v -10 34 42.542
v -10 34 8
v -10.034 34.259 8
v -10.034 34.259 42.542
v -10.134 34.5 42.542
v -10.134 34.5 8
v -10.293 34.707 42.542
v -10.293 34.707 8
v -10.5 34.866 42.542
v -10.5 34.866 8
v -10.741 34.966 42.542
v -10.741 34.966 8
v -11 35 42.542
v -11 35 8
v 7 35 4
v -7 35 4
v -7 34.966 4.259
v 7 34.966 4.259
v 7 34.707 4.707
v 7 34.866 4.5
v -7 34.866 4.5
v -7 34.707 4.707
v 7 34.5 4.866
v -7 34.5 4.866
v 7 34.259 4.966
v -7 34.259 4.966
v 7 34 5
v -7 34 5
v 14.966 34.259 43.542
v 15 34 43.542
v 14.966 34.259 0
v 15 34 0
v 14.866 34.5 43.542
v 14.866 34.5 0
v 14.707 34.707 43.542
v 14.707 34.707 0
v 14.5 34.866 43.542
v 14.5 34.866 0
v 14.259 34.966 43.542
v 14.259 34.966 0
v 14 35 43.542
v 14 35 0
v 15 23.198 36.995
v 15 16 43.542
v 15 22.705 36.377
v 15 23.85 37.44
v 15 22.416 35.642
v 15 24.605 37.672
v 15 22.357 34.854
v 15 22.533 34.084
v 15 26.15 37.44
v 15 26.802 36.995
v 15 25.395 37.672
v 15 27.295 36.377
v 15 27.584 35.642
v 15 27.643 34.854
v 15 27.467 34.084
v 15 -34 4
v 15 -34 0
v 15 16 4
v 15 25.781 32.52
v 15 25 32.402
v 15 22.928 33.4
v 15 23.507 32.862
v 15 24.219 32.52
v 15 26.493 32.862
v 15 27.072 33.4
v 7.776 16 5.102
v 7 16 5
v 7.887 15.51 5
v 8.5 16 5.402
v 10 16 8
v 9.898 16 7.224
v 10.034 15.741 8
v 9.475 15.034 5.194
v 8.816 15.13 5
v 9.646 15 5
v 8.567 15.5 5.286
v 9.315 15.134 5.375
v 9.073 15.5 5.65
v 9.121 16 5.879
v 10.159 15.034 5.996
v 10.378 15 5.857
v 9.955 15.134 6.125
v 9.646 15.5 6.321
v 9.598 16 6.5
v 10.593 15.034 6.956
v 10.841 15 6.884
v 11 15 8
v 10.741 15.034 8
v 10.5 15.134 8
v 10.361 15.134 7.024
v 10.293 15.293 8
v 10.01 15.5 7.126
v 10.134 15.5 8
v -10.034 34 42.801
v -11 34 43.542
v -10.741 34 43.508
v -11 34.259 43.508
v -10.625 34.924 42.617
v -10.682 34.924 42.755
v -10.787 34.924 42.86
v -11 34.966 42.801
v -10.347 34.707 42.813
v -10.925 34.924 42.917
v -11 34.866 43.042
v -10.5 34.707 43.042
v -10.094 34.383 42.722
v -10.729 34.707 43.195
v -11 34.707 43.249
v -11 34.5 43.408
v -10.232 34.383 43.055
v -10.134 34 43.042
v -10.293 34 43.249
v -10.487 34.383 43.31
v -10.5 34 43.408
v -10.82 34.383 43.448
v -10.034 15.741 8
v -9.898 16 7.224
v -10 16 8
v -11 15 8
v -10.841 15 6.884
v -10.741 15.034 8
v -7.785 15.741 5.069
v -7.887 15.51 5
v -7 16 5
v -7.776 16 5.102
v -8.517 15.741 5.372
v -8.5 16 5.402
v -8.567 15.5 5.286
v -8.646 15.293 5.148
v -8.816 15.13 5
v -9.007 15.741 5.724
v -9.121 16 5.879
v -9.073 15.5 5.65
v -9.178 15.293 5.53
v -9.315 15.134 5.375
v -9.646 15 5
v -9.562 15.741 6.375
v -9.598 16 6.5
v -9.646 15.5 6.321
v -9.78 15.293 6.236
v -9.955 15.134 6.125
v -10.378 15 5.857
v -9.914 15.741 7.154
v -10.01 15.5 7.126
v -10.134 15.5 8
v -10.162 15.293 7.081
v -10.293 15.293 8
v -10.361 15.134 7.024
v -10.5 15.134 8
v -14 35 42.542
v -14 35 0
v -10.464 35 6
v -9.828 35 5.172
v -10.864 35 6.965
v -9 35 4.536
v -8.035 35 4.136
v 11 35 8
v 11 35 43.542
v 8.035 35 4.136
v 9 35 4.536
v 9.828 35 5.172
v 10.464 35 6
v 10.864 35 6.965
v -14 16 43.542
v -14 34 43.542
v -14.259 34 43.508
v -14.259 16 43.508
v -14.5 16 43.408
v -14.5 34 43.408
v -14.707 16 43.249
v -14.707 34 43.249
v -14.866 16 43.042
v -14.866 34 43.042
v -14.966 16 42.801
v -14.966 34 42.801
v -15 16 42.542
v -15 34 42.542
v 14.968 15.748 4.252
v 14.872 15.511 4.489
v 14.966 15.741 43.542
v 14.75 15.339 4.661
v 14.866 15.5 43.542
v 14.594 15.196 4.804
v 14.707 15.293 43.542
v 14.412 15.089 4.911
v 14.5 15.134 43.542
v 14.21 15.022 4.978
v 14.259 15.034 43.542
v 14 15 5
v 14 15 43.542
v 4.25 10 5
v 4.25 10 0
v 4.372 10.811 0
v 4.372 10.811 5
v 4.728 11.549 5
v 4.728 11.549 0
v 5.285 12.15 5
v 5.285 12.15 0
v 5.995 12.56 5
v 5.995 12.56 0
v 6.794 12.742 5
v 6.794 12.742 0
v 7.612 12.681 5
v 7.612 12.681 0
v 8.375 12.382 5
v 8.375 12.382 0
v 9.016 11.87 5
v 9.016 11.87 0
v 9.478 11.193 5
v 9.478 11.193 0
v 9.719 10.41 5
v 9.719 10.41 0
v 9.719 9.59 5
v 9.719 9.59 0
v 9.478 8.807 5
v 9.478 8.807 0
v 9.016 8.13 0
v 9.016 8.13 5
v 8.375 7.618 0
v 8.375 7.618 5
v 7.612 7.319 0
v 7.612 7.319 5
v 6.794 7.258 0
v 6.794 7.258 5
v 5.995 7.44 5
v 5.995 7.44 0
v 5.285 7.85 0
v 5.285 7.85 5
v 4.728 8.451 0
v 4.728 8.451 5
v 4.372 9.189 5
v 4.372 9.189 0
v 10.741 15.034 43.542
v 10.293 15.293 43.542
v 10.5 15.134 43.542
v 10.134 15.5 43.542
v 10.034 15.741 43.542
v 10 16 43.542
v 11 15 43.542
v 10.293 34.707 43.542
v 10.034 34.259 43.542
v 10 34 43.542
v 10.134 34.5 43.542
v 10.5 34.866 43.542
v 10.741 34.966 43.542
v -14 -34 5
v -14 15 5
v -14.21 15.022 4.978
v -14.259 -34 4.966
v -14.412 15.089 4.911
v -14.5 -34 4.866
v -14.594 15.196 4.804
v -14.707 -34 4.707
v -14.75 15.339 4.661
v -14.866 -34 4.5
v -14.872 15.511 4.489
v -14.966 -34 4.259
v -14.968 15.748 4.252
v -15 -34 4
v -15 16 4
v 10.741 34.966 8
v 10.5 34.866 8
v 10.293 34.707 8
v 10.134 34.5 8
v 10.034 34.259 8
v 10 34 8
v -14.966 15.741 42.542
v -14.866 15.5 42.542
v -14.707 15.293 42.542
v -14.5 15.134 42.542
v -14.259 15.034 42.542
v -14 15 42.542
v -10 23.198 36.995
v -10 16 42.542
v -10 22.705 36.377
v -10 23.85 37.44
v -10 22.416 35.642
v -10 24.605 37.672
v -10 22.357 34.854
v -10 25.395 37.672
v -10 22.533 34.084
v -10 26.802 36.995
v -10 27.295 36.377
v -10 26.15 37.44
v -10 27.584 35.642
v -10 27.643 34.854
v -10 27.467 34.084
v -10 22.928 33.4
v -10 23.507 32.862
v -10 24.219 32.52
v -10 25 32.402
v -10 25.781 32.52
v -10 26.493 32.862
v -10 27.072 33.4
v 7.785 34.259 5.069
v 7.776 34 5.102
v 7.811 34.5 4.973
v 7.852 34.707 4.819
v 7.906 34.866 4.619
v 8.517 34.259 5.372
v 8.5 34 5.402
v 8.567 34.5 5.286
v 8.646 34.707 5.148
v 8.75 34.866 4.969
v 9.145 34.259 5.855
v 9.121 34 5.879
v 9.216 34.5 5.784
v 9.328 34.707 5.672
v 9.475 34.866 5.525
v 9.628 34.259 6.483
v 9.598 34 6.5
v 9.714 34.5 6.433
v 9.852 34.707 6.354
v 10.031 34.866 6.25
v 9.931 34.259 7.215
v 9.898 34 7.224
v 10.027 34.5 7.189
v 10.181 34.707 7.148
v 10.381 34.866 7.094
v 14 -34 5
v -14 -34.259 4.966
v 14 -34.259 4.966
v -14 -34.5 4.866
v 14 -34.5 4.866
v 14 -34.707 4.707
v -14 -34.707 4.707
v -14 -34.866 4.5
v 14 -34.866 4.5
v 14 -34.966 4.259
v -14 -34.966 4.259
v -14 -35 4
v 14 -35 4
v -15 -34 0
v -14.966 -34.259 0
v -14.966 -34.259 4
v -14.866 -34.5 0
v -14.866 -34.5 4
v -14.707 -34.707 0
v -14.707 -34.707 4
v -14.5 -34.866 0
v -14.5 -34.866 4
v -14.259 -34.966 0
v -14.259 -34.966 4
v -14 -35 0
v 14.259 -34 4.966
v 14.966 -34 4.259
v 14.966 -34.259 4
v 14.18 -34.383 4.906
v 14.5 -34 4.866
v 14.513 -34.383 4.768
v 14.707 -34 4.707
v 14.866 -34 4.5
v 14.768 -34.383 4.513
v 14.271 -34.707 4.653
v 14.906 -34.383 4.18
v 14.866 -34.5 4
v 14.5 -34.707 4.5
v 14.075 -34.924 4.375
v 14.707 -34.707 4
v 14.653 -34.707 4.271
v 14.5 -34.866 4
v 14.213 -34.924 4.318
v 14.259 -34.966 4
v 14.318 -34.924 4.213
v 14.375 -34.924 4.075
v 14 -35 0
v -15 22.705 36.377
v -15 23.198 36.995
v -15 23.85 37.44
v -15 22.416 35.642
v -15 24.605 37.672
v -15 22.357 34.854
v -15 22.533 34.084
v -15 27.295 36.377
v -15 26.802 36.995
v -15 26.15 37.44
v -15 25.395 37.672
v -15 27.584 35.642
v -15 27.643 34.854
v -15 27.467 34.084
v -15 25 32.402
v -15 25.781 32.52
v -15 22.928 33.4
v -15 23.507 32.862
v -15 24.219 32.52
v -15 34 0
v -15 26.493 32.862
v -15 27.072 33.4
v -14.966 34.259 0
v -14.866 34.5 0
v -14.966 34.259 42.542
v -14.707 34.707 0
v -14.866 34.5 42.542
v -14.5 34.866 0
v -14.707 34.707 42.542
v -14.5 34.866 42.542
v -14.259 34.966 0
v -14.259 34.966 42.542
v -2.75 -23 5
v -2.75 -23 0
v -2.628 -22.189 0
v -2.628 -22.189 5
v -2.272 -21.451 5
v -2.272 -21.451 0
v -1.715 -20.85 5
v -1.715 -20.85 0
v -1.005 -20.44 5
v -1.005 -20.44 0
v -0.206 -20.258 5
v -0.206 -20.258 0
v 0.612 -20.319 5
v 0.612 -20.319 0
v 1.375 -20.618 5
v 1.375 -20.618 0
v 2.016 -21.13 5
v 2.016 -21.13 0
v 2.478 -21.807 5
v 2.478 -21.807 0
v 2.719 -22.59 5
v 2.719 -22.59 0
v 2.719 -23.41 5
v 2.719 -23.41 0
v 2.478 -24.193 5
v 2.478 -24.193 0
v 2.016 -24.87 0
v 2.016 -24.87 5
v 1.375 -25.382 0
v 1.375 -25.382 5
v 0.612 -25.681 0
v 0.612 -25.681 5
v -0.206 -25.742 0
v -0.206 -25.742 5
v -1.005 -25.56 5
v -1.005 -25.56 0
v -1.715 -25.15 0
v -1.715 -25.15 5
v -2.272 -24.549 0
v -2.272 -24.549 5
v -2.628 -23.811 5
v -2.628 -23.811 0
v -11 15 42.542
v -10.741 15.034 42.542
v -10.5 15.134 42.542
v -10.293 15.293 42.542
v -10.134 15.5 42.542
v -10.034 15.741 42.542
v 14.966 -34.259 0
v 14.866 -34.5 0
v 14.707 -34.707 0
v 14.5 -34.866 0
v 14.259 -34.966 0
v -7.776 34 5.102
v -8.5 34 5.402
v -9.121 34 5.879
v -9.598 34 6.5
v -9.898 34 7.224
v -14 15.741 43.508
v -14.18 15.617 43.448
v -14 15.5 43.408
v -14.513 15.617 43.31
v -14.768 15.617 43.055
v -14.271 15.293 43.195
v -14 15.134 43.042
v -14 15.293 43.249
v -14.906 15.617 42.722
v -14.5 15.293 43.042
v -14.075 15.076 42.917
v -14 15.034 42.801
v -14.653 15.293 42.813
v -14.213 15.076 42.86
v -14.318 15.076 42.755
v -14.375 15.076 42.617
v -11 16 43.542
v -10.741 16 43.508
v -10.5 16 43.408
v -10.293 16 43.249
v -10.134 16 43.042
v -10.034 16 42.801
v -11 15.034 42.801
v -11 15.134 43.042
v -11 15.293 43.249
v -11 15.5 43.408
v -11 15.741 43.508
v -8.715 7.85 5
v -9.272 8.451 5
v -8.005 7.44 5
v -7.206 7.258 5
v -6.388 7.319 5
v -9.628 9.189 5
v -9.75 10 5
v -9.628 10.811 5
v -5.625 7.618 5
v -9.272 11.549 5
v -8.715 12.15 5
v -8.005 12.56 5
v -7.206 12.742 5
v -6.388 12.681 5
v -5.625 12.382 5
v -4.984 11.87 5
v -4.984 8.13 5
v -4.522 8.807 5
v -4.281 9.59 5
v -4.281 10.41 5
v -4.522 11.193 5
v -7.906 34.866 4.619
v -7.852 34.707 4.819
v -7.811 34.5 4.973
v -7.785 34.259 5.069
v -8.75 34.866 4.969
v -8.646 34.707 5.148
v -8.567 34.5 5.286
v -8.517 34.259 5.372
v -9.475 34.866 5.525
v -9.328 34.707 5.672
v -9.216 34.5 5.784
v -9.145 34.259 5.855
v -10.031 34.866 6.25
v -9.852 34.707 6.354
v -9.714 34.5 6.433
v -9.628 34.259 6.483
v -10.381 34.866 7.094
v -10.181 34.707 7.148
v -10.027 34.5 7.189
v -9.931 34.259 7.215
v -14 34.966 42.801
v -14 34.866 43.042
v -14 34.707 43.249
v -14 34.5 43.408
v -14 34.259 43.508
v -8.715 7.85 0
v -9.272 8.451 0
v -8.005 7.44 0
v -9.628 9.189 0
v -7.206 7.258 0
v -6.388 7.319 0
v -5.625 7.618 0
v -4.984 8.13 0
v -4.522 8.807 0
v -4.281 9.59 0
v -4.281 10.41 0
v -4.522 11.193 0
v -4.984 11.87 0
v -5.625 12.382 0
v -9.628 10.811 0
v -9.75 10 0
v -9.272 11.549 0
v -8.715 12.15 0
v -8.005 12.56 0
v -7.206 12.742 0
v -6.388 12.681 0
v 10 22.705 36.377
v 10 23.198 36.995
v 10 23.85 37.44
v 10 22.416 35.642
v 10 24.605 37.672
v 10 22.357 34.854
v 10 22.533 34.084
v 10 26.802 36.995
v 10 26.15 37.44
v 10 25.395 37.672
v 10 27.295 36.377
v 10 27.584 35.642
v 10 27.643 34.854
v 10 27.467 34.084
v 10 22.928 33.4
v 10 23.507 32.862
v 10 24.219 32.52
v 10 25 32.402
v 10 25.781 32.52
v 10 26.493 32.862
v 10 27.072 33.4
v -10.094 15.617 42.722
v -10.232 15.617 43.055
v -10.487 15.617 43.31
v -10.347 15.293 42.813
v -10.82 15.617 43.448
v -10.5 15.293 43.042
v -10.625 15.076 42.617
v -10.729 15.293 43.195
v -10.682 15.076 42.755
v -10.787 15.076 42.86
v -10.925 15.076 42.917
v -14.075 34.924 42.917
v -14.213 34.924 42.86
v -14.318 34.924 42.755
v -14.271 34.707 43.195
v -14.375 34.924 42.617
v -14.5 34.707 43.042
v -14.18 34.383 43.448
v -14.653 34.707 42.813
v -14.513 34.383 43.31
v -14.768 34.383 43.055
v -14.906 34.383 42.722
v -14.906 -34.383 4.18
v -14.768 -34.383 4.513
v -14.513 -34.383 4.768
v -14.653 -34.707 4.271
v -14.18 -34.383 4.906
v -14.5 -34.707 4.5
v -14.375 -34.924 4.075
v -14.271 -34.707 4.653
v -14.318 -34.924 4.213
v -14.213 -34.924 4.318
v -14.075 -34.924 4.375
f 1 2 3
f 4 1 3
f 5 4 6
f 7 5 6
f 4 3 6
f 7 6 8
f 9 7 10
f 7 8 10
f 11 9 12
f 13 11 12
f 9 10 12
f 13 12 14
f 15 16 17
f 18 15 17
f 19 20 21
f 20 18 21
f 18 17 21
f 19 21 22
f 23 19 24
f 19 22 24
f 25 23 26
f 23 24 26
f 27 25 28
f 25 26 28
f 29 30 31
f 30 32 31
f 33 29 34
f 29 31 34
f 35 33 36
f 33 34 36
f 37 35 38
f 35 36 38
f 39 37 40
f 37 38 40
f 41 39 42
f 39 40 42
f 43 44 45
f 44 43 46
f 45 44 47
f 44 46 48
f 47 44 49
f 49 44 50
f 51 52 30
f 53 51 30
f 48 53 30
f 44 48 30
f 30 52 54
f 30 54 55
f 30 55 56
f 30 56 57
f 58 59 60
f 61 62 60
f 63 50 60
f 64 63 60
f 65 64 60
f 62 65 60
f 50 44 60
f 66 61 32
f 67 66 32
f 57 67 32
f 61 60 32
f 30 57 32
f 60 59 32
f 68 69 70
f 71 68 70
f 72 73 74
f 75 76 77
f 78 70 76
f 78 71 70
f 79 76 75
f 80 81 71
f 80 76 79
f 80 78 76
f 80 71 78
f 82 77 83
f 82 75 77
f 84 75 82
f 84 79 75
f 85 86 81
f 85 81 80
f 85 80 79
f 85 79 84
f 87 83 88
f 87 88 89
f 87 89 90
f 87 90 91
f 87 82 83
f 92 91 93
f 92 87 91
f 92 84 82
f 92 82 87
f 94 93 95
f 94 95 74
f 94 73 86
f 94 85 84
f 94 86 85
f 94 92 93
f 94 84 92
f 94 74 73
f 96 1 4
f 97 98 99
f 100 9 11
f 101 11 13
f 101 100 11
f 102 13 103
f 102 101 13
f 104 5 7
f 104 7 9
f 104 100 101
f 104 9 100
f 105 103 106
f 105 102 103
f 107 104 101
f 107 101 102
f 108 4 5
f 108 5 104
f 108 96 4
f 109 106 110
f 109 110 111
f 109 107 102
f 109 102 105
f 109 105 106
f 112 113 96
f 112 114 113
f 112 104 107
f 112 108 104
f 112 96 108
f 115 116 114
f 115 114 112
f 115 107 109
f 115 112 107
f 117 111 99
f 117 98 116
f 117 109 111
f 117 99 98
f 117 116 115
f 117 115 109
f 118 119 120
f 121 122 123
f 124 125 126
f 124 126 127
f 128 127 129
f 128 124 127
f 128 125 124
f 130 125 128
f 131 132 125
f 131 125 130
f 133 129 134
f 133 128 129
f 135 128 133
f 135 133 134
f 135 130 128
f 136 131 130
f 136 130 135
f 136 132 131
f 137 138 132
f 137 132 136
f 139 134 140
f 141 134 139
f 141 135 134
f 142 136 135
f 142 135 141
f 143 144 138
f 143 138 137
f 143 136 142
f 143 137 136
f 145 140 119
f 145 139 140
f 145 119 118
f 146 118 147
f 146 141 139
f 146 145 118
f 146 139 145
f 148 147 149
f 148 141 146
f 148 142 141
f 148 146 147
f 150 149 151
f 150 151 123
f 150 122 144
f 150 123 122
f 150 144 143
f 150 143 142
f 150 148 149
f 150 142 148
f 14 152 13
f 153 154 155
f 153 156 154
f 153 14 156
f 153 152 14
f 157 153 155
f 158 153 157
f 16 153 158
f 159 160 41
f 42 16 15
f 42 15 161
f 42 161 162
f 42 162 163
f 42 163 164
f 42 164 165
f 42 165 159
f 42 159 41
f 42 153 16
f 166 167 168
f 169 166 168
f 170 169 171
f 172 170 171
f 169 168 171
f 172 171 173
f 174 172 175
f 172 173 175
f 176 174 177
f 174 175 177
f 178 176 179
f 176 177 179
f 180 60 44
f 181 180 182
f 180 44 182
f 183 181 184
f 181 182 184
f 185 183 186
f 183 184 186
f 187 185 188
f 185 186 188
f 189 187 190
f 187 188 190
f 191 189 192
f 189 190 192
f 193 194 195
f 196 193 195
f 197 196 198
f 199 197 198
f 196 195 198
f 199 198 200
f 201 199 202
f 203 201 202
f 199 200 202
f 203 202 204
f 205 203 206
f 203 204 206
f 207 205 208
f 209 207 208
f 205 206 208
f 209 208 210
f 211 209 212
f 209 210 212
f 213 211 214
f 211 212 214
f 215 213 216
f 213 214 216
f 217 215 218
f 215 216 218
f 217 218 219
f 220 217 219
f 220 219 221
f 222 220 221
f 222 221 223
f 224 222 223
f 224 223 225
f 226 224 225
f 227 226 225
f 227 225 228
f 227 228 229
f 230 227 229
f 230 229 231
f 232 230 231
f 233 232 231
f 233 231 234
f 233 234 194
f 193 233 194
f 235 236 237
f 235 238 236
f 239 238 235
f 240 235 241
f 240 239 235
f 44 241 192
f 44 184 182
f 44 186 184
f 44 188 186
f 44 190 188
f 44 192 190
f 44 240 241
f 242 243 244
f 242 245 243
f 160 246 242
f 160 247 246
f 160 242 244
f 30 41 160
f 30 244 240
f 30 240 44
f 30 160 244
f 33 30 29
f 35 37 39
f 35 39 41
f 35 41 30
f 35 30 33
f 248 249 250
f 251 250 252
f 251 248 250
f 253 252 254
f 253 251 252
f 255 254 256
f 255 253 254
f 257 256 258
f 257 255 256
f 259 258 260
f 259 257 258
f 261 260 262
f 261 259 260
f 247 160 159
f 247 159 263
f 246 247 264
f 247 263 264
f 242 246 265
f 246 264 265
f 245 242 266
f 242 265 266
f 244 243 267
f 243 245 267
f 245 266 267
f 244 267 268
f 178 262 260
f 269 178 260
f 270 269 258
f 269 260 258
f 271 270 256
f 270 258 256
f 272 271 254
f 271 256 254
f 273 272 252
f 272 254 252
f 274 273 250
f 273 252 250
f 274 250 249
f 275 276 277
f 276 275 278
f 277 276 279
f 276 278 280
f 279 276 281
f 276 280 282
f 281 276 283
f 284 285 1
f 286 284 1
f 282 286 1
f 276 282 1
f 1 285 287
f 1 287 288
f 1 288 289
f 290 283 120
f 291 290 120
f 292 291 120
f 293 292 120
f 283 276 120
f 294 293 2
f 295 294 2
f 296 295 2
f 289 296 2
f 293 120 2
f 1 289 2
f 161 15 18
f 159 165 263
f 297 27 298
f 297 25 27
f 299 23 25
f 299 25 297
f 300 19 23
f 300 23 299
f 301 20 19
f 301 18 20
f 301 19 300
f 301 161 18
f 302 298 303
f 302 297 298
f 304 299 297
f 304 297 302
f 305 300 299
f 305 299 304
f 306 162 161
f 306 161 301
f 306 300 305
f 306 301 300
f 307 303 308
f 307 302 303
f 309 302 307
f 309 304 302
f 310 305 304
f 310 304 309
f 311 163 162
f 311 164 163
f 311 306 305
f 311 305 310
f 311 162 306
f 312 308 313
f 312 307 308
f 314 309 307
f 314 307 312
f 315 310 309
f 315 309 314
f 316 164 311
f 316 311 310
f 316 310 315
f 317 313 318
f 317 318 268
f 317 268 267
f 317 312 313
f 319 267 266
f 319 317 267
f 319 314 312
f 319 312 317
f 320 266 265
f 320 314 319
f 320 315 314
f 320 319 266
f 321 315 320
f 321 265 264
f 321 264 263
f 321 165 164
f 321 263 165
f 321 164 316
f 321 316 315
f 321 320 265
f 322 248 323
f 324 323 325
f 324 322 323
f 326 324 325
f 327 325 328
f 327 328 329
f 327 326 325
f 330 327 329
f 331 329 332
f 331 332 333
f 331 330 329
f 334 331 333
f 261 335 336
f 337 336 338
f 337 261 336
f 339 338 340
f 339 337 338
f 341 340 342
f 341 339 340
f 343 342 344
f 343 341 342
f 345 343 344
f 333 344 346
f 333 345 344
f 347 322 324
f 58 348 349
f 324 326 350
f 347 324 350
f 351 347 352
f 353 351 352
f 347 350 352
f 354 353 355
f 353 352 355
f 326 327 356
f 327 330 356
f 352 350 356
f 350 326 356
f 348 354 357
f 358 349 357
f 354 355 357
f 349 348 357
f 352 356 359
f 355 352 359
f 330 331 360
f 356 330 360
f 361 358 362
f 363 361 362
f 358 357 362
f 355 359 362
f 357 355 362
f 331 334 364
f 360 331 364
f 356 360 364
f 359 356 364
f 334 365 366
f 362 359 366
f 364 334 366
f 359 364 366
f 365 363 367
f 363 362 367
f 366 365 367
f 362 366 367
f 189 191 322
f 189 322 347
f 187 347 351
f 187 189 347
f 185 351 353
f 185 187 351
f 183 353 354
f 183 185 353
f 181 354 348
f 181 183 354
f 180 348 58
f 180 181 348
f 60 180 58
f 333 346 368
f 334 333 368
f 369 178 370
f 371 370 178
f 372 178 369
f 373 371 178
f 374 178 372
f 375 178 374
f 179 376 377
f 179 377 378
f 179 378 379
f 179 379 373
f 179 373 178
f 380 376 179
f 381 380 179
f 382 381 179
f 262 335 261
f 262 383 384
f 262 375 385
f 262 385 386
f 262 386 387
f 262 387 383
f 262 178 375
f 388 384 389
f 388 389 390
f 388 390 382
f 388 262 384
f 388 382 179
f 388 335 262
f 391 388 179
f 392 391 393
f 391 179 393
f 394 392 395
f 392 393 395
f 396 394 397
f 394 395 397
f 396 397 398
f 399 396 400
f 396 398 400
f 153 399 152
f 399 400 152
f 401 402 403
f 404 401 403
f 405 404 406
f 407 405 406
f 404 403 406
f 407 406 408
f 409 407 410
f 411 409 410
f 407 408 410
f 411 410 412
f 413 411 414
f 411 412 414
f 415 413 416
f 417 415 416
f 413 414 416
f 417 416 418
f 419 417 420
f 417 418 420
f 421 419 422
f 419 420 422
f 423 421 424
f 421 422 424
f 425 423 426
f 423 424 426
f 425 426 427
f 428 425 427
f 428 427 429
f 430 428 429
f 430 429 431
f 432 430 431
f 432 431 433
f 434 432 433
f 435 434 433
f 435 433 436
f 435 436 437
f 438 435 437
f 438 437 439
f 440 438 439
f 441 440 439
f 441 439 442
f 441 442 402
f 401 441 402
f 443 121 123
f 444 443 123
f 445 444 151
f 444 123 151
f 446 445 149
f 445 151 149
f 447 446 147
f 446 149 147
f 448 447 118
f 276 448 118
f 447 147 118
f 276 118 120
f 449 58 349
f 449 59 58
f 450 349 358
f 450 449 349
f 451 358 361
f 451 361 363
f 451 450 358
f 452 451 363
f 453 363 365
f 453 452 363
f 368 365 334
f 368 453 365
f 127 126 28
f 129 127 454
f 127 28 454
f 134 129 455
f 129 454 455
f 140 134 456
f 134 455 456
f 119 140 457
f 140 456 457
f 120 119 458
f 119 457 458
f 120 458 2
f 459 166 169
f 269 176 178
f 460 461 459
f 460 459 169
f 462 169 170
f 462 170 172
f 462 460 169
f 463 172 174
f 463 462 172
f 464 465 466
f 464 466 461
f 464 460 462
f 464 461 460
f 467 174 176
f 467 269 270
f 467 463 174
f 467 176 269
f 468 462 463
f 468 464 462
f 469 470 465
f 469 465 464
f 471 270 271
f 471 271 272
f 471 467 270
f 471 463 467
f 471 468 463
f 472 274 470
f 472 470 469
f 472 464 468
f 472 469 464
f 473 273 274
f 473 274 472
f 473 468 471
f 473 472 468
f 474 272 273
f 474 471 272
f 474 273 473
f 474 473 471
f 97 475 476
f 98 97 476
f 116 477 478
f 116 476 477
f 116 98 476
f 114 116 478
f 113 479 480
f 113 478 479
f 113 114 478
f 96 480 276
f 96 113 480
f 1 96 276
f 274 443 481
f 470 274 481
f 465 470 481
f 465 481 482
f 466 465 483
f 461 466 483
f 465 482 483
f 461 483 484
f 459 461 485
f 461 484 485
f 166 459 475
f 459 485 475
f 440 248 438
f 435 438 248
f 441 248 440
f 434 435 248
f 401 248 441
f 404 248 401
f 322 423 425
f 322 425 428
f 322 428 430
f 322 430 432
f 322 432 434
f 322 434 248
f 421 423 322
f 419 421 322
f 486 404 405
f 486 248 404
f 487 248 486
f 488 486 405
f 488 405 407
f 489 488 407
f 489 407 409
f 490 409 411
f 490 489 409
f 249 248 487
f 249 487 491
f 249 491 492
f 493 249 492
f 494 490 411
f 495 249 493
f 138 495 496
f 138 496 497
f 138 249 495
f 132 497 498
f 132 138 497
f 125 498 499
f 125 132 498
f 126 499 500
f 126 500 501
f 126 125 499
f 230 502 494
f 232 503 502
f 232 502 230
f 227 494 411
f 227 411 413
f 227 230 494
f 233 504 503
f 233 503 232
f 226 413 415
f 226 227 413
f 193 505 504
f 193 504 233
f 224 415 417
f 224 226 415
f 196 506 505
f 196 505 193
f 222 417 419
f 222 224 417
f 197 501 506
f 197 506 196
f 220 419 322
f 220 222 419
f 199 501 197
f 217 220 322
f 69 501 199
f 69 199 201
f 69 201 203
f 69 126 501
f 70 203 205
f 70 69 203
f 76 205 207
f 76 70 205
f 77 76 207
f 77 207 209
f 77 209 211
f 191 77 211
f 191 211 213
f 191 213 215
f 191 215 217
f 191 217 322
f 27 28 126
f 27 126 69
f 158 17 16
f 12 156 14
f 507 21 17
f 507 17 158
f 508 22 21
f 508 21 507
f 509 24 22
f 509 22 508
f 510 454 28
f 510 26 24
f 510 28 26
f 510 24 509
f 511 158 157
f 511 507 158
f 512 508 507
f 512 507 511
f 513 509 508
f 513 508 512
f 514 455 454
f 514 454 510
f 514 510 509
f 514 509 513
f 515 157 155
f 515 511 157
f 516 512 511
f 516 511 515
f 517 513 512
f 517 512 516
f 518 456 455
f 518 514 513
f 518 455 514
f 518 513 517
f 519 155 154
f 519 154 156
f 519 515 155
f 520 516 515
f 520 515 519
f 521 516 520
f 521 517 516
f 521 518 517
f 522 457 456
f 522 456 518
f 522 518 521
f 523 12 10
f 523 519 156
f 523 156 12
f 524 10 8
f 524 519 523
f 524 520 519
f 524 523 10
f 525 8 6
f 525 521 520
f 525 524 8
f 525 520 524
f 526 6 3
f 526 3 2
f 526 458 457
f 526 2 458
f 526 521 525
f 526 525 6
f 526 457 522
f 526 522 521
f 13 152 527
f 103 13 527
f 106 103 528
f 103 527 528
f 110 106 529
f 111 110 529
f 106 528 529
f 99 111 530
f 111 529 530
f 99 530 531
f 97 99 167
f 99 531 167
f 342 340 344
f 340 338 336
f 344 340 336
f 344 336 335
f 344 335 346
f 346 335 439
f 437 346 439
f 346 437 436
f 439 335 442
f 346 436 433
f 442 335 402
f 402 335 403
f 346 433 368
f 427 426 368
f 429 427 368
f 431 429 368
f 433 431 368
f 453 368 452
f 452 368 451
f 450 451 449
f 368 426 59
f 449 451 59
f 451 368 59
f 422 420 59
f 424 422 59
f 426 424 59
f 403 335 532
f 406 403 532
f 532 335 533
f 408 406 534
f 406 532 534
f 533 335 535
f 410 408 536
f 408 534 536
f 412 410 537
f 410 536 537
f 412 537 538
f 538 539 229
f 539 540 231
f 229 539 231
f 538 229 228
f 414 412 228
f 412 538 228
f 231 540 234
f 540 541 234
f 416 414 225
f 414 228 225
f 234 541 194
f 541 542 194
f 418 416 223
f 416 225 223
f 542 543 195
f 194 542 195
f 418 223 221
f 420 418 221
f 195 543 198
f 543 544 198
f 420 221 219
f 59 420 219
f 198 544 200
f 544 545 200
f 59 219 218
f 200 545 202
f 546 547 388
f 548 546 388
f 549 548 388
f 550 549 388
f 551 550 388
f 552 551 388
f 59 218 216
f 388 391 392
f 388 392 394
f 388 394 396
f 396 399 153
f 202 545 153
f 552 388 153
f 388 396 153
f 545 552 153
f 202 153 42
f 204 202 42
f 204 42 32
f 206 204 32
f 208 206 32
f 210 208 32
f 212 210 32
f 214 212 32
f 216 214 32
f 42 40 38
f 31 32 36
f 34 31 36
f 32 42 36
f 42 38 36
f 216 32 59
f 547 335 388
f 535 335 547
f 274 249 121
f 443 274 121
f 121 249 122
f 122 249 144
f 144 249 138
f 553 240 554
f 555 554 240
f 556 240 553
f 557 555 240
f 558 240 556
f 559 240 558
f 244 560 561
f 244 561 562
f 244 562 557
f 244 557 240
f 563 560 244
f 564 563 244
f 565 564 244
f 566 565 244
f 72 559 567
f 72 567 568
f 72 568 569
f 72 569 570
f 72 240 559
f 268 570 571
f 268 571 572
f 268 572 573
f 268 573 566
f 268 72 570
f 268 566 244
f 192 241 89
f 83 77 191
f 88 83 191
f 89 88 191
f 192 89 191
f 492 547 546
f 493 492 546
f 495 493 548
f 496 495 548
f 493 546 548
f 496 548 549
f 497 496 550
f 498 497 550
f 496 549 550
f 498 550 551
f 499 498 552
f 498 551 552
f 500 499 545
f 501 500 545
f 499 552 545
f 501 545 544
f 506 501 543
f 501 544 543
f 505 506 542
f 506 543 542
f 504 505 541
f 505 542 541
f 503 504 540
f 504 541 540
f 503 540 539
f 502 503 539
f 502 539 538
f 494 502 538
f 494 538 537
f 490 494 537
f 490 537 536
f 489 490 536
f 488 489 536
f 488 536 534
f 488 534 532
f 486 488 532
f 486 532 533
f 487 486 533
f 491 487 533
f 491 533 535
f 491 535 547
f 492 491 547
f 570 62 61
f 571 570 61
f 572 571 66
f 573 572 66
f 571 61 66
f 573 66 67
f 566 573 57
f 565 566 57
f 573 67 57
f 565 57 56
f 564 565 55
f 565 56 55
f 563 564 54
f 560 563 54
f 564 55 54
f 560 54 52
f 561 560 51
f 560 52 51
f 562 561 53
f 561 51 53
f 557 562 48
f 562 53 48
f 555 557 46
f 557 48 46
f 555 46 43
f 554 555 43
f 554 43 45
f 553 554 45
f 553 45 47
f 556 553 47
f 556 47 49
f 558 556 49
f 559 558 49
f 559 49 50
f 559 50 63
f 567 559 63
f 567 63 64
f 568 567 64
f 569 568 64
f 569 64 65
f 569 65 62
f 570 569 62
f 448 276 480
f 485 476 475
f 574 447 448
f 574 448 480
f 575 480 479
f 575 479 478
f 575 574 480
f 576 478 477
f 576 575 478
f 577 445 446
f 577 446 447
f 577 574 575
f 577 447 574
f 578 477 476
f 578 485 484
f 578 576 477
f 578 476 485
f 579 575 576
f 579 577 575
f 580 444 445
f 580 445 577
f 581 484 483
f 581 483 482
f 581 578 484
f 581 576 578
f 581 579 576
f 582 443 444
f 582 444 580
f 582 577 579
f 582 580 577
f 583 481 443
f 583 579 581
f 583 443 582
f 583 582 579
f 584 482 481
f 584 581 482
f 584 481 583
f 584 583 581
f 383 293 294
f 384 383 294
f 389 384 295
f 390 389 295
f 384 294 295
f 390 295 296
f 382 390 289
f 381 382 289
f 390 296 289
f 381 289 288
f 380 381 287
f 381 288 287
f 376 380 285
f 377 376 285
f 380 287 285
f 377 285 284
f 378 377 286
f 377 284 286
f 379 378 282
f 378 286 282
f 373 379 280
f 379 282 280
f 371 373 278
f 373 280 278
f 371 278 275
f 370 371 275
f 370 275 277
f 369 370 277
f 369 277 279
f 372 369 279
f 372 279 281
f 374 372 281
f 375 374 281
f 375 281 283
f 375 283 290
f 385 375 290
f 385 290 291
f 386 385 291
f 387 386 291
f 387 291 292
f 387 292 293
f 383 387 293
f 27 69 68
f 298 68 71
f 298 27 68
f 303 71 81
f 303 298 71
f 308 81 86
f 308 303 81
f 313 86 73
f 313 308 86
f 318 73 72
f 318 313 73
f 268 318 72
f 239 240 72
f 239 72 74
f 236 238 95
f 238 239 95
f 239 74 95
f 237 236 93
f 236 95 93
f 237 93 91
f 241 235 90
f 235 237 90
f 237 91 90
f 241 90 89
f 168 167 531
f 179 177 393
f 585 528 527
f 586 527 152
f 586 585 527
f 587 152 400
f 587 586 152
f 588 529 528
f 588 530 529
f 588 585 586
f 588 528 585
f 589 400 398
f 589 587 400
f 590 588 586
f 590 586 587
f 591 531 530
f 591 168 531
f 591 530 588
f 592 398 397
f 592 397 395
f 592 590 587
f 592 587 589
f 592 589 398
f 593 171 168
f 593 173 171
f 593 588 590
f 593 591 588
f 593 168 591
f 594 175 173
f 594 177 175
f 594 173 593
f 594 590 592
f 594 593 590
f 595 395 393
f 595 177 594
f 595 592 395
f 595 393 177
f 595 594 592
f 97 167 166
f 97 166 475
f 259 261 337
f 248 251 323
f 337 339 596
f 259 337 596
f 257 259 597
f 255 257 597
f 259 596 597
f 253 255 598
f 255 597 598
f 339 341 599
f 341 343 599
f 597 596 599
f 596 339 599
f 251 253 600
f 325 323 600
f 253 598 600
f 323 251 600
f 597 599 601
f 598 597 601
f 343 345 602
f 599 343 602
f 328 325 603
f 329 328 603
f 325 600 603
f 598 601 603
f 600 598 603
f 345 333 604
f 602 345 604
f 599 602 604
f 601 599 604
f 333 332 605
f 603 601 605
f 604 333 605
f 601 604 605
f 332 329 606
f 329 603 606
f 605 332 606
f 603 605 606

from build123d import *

# Parameters (mm, degrees)
SKETCH1_W            = 30
SKETCH1_H            = 70
BOSS_EXTRUDE1_DEPTH  = 5
M5_CLEARANCE_HOLE1_D = 5.5
SKETCH4_W            = 5
SKETCH4_H            = 20
BOSS_EXTRUDE2_DEPTH  = 38.541999878
M5_CLEARANCE_HOLE2_D = 5.3
FILLET1_R            = 3
FILLET2_R            = 1
FILLET3_R            = 1
FILLET4_R            = 1
FILLET5_R            = 1
FILLET6_R            = 1


with BuildPart() as part:
    # Sketch1 → Boss-Extrude1 (new body)
    with BuildSketch(Plane.XY):
        Rectangle(SKETCH1_W, SKETCH1_H)
    extrude(amount=BOSS_EXTRUDE1_DEPTH)

    # M5 Clearance Hole1 (through all)
    with Locations(Plane.XY.offset(5)):
        with Locations((0, -23), (-7, 10), (7, 10)):
            Hole(M5_CLEARANCE_HOLE1_D / 2)

    # Sketch4 → Boss-Extrude2 (add)
    with BuildSketch(Plane.XY.offset(5)):
        with Locations((-12.5, 25)):
            Rectangle(SKETCH4_W, SKETCH4_H)
        with Locations((12.5, 25)):
            Rectangle(SKETCH4_W, SKETCH4_H)
    extrude(amount=BOSS_EXTRUDE2_DEPTH)

    # M5 Clearance Hole2 (through all)
    with Locations(Plane.ZY.offset(15)):
        with Locations((35.052, 25)):
            Hole(M5_CLEARANCE_HOLE2_D / 2)

    # Fillet1
    fillet1_edges = [part.edges().sort_by_distance(p)[0] for p in [
        (-10, 25, 5),
        (10, 25, 5),
    ]]
    fillet(fillet1_edges, radius=FILLET1_R)

    # Fillet2
    fillet2_edges = [part.edges().sort_by_distance(p)[0] for p in [
        (-15, 25, 43.541999878),
        (-10, 25, 43.541999878),
    ]]
    fillet(fillet2_edges, radius=FILLET2_R)

    # Fillet3
    # the kernel refuses this fillet: 1 mm, written as the material it takes off along each edge
    with BuildSketch(Plane(origin=(7, 15, 8), x_dir=(-0.7404019062872322, 0, -0.6721644271800112), z_dir=(-0.6721644271800112, 0, 0.7404019062872322))) as fillet3_piece_1_section:
        with BuildLine():
            CenterArc((3 + FILLET3_R, -FILLET3_R), FILLET3_R, 90, 90)
            Line((3 + FILLET3_R, 0), (3, 0))
            Line((3, 0), (3, -FILLET3_R))
        make_face()
    fillet3_piece_1 = revolve(axis=Axis((7, 15, 8), (0, -1, 0)), revolution_arc=137.765663079, mode=Mode.PRIVATE)
    fillet3_piece_1 = split(fillet3_piece_1, bisect_by=Plane(origin=(9.145909212, 15.257974559, 5), z_dir=(0, 0, 1)), keep=Keep.TOP, mode=Mode.PRIVATE)
    add(fillet3_piece_1, mode=Mode.SUBTRACT)
    with BuildSketch(Plane(origin=(-7, 15, 8), x_dir=(0.7404019062872333, 0, -0.6721644271800099), z_dir=(0.6721644271800099, 0, 0.7404019062872333))) as fillet3_piece_2_section:
        with BuildLine():
            CenterArc((3 + FILLET3_R, FILLET3_R), FILLET3_R, 180, 90)
            Line((3 + FILLET3_R, 0), (3, 0))
            Line((3, 0), (3, FILLET3_R))
        make_face()
    fillet3_piece_2 = revolve(axis=Axis((-7, 15, 8), (0, 1, 0)), revolution_arc=137.765663079, mode=Mode.PRIVATE)
    fillet3_piece_2 = split(fillet3_piece_2, bisect_by=Plane(origin=(-9.145909903, 15.257974038, 5), z_dir=(0, 0, 1)), keep=Keep.TOP, mode=Mode.PRIVATE)
    add(fillet3_piece_2, mode=Mode.SUBTRACT)
    with BuildSketch(Plane(origin=(-10, 15, 8), x_dir=(0, 1, 0), z_dir=(0, 0, 1))) as fillet3_piece_3:
        with BuildLine():
            CenterArc((FILLET3_R, FILLET3_R), FILLET3_R, 180, 90)
            Line((0, FILLET3_R), (0, 0))
            Line((0, 0), (FILLET3_R, 0))
        make_face()
    extrude(amount=34.541999878, mode=Mode.SUBTRACT)
    with BuildSketch(Plane(origin=(-11, 15, 42.541999878), x_dir=(1, 0, 0), z_dir=(0, 0, -1))) as fillet3_piece_4:
        with BuildLine():
            CenterArc((1 - FILLET3_R, -FILLET3_R), FILLET3_R, 0, 90)
            Line((1 - FILLET3_R, 0), (1, 0))
            Line((1, 0), (1, -FILLET3_R))
        make_face()
    revolve(axis=Axis((-11, 15, 42.541999878), (0, -1, 0)), revolution_arc=90, mode=Mode.SUBTRACT)
    with BuildSketch(Plane(origin=(-11, 15, 43.541999878), x_dir=(0, 0, -1), z_dir=(-1, 0, 0)), Plane(origin=(-14, 35, 43.541999878), x_dir=(0, 0, -1), z_dir=(1, 0, 0))) as fillet3_piece_5:
        with BuildLine():
            CenterArc((FILLET3_R, -FILLET3_R), FILLET3_R, 90, 90)
            Line((0, -FILLET3_R), (0, 0))
            Line((0, 0), (FILLET3_R, 0))
        make_face()
    extrude(amount=3, mode=Mode.SUBTRACT)
    with BuildSketch(Plane(origin=(-14, 15, 42.541999878), x_dir=(0, 0, 1), z_dir=(1, 0, 0))) as fillet3_piece_6:
        with BuildLine():
            CenterArc((1 - FILLET3_R, -FILLET3_R), FILLET3_R, 0, 90)
            Line((1, -FILLET3_R), (1, 0))
            Line((1, 0), (1 - FILLET3_R, 0))
        make_face()
    revolve(axis=Axis((-14, 15, 42.541999878), (0, -1, 0)), revolution_arc=90, mode=Mode.SUBTRACT)
    with BuildSketch(Plane(origin=(7, 35, 8), x_dir=(0, 0, -1), z_dir=(-1, 0, 0))) as fillet3_piece_7:
        with BuildLine():
            CenterArc((3 + FILLET3_R, FILLET3_R), FILLET3_R, 180, 90)
            Line((3, FILLET3_R), (3, 0))
            Line((3, 0), (3 + FILLET3_R, 0))
        make_face()
    revolve(axis=Axis((7, 35, 8), (0, -1, 0)), revolution_arc=90, mode=Mode.SUBTRACT)
    with BuildSketch(Plane(origin=(-7, 35, 5), x_dir=(0, 0, -1), z_dir=(1, 0, 0))) as fillet3_piece_8:
        with BuildLine():
            CenterArc((FILLET3_R, -FILLET3_R), FILLET3_R, 90, 90)
            Line((0, -FILLET3_R), (0, 0))
            Line((0, 0), (FILLET3_R, 0))
        make_face()
    extrude(amount=14, mode=Mode.SUBTRACT)
    with BuildSketch(Plane(origin=(-7, 35, 8), x_dir=(0, 0, -1), z_dir=(1, 0, 0))) as fillet3_piece_9:
        with BuildLine():
            CenterArc((3 + FILLET3_R, -FILLET3_R), FILLET3_R, 90, 90)
            Line((3, -FILLET3_R), (3, 0))
            Line((3, 0), (3 + FILLET3_R, 0))
        make_face()
    revolve(axis=Axis((-7, 35, 8), (0, 1, 0)), revolution_arc=90, mode=Mode.SUBTRACT)
    with BuildSketch(Plane(origin=(-10, 35, 8), x_dir=(0, -1, 0), z_dir=(0, 0, 1))) as fillet3_piece_10:
        with BuildLine():
            CenterArc((FILLET3_R, -FILLET3_R), FILLET3_R, 90, 90)
            Line((0, -FILLET3_R), (0, 0))
            Line((0, 0), (FILLET3_R, 0))
        make_face()
    extrude(amount=34.541999878, mode=Mode.SUBTRACT)
    with BuildSketch(Plane(origin=(-11, 35, 42.541999878), x_dir=(1, 0, 0), z_dir=(0, 0, -1))) as fillet3_piece_11:
        with BuildLine():
            CenterArc((1 - FILLET3_R, FILLET3_R), FILLET3_R, 270, 90)
            Line((1, FILLET3_R), (1, 0))
            Line((1, 0), (1 - FILLET3_R, 0))
        make_face()
    revolve(axis=Axis((-11, 35, 42.541999878), (0, -1, 0)), revolution_arc=90, mode=Mode.SUBTRACT)
    with BuildSketch(Plane(origin=(-14, 35, 42.541999878), x_dir=(0, 0, 1), z_dir=(1, 0, 0))) as fillet3_piece_12:
        with BuildLine():
            CenterArc((1 - FILLET3_R, FILLET3_R), FILLET3_R, 270, 90)
            Line((1, FILLET3_R), (1, 0))
            Line((1, 0), (1 - FILLET3_R, 0))
        make_face()
    revolve(axis=Axis((-14, 35, 42.541999878), (0, -1, 0)), revolution_arc=90, mode=Mode.SUBTRACT)
    with BuildSketch(Plane(origin=(10, 35, 8), x_dir=(1, 0, 0), z_dir=(0, 0, 1)), Plane(origin=(10, 15, 8), x_dir=(0, 1, 0), z_dir=(0, 0, 1))) as fillet3_piece_13:
        with BuildLine():
            CenterArc((FILLET3_R, -FILLET3_R), FILLET3_R, 90, 90)
            Line((0, -FILLET3_R), (0, 0))
            Line((0, 0), (FILLET3_R, 0))
        make_face()
    extrude(amount=38.041999878, mode=Mode.SUBTRACT)
    with BuildSketch(Plane(origin=(-15, 15, 5), x_dir=(1, 0, 0), z_dir=(0, 0, 1))) as fillet3_piece_14:
        with BuildLine():
            CenterArc((FILLET3_R, FILLET3_R), FILLET3_R, 180, 90)
            Line((0, FILLET3_R), (0, 0))
            Line((0, 0), (FILLET3_R, 0))
        make_face()
    extrude(amount=37.541999878, mode=Mode.SUBTRACT)
    with BuildSketch(Plane(origin=(-15, 35, 42.541999878), x_dir=(1, 0, 0), z_dir=(0, 0, -1))) as fillet3_piece_15:
        with BuildLine():
            CenterArc((FILLET3_R, FILLET3_R), FILLET3_R, 180, 90)
            Line((0, FILLET3_R), (0, 0))
            Line((0, 0), (FILLET3_R, 0))
        make_face()
    extrude(amount=45.041999878, mode=Mode.SUBTRACT)

    # Fillet4
    fillet4_edges = [part.edges().sort_by_distance(p)[0] for p in [
        (15, 15, 24.270999939),
        (15, 35, 21.770999939),
    ]]
    fillet(fillet4_edges, radius=FILLET4_R)

    # Fillet5
    fillet5_edges = [part.edges().sort_by_distance(p)[0] for p in [
        (-15, -9.5, 5),
        (15, -9.5, 5),
    ]]
    fillet(fillet5_edges, radius=FILLET5_R)

    # Fillet6
    fillet6_edges = [part.edges().sort_by_distance(p)[0] for p in [
        (0, -35, 5),
        (15, -35, 2),
        (-15, -35, 2),
        (14.707106781, -35, 4.707106781),
        (-14.707106781, -35, 4.707106781),
    ]]
    fillet(fillet6_edges, radius=FILLET6_R)


solid = part.part
